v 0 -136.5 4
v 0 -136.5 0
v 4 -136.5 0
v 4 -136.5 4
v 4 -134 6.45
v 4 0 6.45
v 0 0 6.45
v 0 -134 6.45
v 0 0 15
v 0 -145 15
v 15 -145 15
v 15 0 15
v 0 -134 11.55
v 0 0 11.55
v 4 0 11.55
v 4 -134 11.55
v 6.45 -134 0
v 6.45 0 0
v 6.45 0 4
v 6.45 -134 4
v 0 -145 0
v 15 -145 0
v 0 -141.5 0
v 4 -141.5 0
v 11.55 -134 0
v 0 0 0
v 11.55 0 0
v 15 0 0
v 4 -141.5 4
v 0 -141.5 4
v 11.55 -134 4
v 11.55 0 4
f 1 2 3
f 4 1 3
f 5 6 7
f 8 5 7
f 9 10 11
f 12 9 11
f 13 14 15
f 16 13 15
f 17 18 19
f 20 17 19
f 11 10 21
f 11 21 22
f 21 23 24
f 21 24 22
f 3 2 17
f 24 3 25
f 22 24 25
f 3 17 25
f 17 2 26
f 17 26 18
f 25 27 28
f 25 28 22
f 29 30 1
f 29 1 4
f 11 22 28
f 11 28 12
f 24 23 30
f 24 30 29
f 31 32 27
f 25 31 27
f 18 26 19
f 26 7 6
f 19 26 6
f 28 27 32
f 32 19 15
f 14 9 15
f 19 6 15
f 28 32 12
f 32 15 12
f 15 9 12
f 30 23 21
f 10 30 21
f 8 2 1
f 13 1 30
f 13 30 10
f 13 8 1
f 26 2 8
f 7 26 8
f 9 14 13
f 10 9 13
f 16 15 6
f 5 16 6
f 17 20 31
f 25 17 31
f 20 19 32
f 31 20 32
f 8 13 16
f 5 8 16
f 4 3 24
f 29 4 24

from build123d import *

# Parameters (mm, degrees)
F1_DEPTH      = 138
F2_W          = 15
F2_H          = 15
F3_DEPTH      = 7
F3_DEPTH_BACK = 4
F4_W          = 4
F4_H          = 5
F5_DEPTH      = 4


with BuildPart() as f1:
    # F0 (on Front) → F1 (new body)
    with BuildSketch(Plane.XZ):
        Polygon((0, 6.45), (0, 0), (6.45, 0), (6.45, 4), (11.55, 4), (11.55, 0), (15, 0), (15, 15), (0, 15), (0, 11.55), (4, 11.55), (4, 6.45), align=None)
    extrude(amount=F1_DEPTH)

    # F2 (on face) → F3 (join, two sides)
    with BuildSketch(Plane.XZ.offset(138)) as f3_sk:
        with Locations((7.5, 7.5)):
            Rectangle(F2_W, F2_H)
    extrude(amount=F3_DEPTH)
    extrude(f3_sk.sketch, amount=-F3_DEPTH_BACK)

    # F4 (on face) → F5 (cut)
    with BuildSketch(Plane(origin=(0, 0, 0), x_dir=(1, 0, 0), z_dir=(0, 0, -1))):
        with Locations((2, 139)):
            Rectangle(F4_W, F4_H)
    extrude(amount=-F5_DEPTH, mode=Mode.SUBTRACT)


solid = f1.part
